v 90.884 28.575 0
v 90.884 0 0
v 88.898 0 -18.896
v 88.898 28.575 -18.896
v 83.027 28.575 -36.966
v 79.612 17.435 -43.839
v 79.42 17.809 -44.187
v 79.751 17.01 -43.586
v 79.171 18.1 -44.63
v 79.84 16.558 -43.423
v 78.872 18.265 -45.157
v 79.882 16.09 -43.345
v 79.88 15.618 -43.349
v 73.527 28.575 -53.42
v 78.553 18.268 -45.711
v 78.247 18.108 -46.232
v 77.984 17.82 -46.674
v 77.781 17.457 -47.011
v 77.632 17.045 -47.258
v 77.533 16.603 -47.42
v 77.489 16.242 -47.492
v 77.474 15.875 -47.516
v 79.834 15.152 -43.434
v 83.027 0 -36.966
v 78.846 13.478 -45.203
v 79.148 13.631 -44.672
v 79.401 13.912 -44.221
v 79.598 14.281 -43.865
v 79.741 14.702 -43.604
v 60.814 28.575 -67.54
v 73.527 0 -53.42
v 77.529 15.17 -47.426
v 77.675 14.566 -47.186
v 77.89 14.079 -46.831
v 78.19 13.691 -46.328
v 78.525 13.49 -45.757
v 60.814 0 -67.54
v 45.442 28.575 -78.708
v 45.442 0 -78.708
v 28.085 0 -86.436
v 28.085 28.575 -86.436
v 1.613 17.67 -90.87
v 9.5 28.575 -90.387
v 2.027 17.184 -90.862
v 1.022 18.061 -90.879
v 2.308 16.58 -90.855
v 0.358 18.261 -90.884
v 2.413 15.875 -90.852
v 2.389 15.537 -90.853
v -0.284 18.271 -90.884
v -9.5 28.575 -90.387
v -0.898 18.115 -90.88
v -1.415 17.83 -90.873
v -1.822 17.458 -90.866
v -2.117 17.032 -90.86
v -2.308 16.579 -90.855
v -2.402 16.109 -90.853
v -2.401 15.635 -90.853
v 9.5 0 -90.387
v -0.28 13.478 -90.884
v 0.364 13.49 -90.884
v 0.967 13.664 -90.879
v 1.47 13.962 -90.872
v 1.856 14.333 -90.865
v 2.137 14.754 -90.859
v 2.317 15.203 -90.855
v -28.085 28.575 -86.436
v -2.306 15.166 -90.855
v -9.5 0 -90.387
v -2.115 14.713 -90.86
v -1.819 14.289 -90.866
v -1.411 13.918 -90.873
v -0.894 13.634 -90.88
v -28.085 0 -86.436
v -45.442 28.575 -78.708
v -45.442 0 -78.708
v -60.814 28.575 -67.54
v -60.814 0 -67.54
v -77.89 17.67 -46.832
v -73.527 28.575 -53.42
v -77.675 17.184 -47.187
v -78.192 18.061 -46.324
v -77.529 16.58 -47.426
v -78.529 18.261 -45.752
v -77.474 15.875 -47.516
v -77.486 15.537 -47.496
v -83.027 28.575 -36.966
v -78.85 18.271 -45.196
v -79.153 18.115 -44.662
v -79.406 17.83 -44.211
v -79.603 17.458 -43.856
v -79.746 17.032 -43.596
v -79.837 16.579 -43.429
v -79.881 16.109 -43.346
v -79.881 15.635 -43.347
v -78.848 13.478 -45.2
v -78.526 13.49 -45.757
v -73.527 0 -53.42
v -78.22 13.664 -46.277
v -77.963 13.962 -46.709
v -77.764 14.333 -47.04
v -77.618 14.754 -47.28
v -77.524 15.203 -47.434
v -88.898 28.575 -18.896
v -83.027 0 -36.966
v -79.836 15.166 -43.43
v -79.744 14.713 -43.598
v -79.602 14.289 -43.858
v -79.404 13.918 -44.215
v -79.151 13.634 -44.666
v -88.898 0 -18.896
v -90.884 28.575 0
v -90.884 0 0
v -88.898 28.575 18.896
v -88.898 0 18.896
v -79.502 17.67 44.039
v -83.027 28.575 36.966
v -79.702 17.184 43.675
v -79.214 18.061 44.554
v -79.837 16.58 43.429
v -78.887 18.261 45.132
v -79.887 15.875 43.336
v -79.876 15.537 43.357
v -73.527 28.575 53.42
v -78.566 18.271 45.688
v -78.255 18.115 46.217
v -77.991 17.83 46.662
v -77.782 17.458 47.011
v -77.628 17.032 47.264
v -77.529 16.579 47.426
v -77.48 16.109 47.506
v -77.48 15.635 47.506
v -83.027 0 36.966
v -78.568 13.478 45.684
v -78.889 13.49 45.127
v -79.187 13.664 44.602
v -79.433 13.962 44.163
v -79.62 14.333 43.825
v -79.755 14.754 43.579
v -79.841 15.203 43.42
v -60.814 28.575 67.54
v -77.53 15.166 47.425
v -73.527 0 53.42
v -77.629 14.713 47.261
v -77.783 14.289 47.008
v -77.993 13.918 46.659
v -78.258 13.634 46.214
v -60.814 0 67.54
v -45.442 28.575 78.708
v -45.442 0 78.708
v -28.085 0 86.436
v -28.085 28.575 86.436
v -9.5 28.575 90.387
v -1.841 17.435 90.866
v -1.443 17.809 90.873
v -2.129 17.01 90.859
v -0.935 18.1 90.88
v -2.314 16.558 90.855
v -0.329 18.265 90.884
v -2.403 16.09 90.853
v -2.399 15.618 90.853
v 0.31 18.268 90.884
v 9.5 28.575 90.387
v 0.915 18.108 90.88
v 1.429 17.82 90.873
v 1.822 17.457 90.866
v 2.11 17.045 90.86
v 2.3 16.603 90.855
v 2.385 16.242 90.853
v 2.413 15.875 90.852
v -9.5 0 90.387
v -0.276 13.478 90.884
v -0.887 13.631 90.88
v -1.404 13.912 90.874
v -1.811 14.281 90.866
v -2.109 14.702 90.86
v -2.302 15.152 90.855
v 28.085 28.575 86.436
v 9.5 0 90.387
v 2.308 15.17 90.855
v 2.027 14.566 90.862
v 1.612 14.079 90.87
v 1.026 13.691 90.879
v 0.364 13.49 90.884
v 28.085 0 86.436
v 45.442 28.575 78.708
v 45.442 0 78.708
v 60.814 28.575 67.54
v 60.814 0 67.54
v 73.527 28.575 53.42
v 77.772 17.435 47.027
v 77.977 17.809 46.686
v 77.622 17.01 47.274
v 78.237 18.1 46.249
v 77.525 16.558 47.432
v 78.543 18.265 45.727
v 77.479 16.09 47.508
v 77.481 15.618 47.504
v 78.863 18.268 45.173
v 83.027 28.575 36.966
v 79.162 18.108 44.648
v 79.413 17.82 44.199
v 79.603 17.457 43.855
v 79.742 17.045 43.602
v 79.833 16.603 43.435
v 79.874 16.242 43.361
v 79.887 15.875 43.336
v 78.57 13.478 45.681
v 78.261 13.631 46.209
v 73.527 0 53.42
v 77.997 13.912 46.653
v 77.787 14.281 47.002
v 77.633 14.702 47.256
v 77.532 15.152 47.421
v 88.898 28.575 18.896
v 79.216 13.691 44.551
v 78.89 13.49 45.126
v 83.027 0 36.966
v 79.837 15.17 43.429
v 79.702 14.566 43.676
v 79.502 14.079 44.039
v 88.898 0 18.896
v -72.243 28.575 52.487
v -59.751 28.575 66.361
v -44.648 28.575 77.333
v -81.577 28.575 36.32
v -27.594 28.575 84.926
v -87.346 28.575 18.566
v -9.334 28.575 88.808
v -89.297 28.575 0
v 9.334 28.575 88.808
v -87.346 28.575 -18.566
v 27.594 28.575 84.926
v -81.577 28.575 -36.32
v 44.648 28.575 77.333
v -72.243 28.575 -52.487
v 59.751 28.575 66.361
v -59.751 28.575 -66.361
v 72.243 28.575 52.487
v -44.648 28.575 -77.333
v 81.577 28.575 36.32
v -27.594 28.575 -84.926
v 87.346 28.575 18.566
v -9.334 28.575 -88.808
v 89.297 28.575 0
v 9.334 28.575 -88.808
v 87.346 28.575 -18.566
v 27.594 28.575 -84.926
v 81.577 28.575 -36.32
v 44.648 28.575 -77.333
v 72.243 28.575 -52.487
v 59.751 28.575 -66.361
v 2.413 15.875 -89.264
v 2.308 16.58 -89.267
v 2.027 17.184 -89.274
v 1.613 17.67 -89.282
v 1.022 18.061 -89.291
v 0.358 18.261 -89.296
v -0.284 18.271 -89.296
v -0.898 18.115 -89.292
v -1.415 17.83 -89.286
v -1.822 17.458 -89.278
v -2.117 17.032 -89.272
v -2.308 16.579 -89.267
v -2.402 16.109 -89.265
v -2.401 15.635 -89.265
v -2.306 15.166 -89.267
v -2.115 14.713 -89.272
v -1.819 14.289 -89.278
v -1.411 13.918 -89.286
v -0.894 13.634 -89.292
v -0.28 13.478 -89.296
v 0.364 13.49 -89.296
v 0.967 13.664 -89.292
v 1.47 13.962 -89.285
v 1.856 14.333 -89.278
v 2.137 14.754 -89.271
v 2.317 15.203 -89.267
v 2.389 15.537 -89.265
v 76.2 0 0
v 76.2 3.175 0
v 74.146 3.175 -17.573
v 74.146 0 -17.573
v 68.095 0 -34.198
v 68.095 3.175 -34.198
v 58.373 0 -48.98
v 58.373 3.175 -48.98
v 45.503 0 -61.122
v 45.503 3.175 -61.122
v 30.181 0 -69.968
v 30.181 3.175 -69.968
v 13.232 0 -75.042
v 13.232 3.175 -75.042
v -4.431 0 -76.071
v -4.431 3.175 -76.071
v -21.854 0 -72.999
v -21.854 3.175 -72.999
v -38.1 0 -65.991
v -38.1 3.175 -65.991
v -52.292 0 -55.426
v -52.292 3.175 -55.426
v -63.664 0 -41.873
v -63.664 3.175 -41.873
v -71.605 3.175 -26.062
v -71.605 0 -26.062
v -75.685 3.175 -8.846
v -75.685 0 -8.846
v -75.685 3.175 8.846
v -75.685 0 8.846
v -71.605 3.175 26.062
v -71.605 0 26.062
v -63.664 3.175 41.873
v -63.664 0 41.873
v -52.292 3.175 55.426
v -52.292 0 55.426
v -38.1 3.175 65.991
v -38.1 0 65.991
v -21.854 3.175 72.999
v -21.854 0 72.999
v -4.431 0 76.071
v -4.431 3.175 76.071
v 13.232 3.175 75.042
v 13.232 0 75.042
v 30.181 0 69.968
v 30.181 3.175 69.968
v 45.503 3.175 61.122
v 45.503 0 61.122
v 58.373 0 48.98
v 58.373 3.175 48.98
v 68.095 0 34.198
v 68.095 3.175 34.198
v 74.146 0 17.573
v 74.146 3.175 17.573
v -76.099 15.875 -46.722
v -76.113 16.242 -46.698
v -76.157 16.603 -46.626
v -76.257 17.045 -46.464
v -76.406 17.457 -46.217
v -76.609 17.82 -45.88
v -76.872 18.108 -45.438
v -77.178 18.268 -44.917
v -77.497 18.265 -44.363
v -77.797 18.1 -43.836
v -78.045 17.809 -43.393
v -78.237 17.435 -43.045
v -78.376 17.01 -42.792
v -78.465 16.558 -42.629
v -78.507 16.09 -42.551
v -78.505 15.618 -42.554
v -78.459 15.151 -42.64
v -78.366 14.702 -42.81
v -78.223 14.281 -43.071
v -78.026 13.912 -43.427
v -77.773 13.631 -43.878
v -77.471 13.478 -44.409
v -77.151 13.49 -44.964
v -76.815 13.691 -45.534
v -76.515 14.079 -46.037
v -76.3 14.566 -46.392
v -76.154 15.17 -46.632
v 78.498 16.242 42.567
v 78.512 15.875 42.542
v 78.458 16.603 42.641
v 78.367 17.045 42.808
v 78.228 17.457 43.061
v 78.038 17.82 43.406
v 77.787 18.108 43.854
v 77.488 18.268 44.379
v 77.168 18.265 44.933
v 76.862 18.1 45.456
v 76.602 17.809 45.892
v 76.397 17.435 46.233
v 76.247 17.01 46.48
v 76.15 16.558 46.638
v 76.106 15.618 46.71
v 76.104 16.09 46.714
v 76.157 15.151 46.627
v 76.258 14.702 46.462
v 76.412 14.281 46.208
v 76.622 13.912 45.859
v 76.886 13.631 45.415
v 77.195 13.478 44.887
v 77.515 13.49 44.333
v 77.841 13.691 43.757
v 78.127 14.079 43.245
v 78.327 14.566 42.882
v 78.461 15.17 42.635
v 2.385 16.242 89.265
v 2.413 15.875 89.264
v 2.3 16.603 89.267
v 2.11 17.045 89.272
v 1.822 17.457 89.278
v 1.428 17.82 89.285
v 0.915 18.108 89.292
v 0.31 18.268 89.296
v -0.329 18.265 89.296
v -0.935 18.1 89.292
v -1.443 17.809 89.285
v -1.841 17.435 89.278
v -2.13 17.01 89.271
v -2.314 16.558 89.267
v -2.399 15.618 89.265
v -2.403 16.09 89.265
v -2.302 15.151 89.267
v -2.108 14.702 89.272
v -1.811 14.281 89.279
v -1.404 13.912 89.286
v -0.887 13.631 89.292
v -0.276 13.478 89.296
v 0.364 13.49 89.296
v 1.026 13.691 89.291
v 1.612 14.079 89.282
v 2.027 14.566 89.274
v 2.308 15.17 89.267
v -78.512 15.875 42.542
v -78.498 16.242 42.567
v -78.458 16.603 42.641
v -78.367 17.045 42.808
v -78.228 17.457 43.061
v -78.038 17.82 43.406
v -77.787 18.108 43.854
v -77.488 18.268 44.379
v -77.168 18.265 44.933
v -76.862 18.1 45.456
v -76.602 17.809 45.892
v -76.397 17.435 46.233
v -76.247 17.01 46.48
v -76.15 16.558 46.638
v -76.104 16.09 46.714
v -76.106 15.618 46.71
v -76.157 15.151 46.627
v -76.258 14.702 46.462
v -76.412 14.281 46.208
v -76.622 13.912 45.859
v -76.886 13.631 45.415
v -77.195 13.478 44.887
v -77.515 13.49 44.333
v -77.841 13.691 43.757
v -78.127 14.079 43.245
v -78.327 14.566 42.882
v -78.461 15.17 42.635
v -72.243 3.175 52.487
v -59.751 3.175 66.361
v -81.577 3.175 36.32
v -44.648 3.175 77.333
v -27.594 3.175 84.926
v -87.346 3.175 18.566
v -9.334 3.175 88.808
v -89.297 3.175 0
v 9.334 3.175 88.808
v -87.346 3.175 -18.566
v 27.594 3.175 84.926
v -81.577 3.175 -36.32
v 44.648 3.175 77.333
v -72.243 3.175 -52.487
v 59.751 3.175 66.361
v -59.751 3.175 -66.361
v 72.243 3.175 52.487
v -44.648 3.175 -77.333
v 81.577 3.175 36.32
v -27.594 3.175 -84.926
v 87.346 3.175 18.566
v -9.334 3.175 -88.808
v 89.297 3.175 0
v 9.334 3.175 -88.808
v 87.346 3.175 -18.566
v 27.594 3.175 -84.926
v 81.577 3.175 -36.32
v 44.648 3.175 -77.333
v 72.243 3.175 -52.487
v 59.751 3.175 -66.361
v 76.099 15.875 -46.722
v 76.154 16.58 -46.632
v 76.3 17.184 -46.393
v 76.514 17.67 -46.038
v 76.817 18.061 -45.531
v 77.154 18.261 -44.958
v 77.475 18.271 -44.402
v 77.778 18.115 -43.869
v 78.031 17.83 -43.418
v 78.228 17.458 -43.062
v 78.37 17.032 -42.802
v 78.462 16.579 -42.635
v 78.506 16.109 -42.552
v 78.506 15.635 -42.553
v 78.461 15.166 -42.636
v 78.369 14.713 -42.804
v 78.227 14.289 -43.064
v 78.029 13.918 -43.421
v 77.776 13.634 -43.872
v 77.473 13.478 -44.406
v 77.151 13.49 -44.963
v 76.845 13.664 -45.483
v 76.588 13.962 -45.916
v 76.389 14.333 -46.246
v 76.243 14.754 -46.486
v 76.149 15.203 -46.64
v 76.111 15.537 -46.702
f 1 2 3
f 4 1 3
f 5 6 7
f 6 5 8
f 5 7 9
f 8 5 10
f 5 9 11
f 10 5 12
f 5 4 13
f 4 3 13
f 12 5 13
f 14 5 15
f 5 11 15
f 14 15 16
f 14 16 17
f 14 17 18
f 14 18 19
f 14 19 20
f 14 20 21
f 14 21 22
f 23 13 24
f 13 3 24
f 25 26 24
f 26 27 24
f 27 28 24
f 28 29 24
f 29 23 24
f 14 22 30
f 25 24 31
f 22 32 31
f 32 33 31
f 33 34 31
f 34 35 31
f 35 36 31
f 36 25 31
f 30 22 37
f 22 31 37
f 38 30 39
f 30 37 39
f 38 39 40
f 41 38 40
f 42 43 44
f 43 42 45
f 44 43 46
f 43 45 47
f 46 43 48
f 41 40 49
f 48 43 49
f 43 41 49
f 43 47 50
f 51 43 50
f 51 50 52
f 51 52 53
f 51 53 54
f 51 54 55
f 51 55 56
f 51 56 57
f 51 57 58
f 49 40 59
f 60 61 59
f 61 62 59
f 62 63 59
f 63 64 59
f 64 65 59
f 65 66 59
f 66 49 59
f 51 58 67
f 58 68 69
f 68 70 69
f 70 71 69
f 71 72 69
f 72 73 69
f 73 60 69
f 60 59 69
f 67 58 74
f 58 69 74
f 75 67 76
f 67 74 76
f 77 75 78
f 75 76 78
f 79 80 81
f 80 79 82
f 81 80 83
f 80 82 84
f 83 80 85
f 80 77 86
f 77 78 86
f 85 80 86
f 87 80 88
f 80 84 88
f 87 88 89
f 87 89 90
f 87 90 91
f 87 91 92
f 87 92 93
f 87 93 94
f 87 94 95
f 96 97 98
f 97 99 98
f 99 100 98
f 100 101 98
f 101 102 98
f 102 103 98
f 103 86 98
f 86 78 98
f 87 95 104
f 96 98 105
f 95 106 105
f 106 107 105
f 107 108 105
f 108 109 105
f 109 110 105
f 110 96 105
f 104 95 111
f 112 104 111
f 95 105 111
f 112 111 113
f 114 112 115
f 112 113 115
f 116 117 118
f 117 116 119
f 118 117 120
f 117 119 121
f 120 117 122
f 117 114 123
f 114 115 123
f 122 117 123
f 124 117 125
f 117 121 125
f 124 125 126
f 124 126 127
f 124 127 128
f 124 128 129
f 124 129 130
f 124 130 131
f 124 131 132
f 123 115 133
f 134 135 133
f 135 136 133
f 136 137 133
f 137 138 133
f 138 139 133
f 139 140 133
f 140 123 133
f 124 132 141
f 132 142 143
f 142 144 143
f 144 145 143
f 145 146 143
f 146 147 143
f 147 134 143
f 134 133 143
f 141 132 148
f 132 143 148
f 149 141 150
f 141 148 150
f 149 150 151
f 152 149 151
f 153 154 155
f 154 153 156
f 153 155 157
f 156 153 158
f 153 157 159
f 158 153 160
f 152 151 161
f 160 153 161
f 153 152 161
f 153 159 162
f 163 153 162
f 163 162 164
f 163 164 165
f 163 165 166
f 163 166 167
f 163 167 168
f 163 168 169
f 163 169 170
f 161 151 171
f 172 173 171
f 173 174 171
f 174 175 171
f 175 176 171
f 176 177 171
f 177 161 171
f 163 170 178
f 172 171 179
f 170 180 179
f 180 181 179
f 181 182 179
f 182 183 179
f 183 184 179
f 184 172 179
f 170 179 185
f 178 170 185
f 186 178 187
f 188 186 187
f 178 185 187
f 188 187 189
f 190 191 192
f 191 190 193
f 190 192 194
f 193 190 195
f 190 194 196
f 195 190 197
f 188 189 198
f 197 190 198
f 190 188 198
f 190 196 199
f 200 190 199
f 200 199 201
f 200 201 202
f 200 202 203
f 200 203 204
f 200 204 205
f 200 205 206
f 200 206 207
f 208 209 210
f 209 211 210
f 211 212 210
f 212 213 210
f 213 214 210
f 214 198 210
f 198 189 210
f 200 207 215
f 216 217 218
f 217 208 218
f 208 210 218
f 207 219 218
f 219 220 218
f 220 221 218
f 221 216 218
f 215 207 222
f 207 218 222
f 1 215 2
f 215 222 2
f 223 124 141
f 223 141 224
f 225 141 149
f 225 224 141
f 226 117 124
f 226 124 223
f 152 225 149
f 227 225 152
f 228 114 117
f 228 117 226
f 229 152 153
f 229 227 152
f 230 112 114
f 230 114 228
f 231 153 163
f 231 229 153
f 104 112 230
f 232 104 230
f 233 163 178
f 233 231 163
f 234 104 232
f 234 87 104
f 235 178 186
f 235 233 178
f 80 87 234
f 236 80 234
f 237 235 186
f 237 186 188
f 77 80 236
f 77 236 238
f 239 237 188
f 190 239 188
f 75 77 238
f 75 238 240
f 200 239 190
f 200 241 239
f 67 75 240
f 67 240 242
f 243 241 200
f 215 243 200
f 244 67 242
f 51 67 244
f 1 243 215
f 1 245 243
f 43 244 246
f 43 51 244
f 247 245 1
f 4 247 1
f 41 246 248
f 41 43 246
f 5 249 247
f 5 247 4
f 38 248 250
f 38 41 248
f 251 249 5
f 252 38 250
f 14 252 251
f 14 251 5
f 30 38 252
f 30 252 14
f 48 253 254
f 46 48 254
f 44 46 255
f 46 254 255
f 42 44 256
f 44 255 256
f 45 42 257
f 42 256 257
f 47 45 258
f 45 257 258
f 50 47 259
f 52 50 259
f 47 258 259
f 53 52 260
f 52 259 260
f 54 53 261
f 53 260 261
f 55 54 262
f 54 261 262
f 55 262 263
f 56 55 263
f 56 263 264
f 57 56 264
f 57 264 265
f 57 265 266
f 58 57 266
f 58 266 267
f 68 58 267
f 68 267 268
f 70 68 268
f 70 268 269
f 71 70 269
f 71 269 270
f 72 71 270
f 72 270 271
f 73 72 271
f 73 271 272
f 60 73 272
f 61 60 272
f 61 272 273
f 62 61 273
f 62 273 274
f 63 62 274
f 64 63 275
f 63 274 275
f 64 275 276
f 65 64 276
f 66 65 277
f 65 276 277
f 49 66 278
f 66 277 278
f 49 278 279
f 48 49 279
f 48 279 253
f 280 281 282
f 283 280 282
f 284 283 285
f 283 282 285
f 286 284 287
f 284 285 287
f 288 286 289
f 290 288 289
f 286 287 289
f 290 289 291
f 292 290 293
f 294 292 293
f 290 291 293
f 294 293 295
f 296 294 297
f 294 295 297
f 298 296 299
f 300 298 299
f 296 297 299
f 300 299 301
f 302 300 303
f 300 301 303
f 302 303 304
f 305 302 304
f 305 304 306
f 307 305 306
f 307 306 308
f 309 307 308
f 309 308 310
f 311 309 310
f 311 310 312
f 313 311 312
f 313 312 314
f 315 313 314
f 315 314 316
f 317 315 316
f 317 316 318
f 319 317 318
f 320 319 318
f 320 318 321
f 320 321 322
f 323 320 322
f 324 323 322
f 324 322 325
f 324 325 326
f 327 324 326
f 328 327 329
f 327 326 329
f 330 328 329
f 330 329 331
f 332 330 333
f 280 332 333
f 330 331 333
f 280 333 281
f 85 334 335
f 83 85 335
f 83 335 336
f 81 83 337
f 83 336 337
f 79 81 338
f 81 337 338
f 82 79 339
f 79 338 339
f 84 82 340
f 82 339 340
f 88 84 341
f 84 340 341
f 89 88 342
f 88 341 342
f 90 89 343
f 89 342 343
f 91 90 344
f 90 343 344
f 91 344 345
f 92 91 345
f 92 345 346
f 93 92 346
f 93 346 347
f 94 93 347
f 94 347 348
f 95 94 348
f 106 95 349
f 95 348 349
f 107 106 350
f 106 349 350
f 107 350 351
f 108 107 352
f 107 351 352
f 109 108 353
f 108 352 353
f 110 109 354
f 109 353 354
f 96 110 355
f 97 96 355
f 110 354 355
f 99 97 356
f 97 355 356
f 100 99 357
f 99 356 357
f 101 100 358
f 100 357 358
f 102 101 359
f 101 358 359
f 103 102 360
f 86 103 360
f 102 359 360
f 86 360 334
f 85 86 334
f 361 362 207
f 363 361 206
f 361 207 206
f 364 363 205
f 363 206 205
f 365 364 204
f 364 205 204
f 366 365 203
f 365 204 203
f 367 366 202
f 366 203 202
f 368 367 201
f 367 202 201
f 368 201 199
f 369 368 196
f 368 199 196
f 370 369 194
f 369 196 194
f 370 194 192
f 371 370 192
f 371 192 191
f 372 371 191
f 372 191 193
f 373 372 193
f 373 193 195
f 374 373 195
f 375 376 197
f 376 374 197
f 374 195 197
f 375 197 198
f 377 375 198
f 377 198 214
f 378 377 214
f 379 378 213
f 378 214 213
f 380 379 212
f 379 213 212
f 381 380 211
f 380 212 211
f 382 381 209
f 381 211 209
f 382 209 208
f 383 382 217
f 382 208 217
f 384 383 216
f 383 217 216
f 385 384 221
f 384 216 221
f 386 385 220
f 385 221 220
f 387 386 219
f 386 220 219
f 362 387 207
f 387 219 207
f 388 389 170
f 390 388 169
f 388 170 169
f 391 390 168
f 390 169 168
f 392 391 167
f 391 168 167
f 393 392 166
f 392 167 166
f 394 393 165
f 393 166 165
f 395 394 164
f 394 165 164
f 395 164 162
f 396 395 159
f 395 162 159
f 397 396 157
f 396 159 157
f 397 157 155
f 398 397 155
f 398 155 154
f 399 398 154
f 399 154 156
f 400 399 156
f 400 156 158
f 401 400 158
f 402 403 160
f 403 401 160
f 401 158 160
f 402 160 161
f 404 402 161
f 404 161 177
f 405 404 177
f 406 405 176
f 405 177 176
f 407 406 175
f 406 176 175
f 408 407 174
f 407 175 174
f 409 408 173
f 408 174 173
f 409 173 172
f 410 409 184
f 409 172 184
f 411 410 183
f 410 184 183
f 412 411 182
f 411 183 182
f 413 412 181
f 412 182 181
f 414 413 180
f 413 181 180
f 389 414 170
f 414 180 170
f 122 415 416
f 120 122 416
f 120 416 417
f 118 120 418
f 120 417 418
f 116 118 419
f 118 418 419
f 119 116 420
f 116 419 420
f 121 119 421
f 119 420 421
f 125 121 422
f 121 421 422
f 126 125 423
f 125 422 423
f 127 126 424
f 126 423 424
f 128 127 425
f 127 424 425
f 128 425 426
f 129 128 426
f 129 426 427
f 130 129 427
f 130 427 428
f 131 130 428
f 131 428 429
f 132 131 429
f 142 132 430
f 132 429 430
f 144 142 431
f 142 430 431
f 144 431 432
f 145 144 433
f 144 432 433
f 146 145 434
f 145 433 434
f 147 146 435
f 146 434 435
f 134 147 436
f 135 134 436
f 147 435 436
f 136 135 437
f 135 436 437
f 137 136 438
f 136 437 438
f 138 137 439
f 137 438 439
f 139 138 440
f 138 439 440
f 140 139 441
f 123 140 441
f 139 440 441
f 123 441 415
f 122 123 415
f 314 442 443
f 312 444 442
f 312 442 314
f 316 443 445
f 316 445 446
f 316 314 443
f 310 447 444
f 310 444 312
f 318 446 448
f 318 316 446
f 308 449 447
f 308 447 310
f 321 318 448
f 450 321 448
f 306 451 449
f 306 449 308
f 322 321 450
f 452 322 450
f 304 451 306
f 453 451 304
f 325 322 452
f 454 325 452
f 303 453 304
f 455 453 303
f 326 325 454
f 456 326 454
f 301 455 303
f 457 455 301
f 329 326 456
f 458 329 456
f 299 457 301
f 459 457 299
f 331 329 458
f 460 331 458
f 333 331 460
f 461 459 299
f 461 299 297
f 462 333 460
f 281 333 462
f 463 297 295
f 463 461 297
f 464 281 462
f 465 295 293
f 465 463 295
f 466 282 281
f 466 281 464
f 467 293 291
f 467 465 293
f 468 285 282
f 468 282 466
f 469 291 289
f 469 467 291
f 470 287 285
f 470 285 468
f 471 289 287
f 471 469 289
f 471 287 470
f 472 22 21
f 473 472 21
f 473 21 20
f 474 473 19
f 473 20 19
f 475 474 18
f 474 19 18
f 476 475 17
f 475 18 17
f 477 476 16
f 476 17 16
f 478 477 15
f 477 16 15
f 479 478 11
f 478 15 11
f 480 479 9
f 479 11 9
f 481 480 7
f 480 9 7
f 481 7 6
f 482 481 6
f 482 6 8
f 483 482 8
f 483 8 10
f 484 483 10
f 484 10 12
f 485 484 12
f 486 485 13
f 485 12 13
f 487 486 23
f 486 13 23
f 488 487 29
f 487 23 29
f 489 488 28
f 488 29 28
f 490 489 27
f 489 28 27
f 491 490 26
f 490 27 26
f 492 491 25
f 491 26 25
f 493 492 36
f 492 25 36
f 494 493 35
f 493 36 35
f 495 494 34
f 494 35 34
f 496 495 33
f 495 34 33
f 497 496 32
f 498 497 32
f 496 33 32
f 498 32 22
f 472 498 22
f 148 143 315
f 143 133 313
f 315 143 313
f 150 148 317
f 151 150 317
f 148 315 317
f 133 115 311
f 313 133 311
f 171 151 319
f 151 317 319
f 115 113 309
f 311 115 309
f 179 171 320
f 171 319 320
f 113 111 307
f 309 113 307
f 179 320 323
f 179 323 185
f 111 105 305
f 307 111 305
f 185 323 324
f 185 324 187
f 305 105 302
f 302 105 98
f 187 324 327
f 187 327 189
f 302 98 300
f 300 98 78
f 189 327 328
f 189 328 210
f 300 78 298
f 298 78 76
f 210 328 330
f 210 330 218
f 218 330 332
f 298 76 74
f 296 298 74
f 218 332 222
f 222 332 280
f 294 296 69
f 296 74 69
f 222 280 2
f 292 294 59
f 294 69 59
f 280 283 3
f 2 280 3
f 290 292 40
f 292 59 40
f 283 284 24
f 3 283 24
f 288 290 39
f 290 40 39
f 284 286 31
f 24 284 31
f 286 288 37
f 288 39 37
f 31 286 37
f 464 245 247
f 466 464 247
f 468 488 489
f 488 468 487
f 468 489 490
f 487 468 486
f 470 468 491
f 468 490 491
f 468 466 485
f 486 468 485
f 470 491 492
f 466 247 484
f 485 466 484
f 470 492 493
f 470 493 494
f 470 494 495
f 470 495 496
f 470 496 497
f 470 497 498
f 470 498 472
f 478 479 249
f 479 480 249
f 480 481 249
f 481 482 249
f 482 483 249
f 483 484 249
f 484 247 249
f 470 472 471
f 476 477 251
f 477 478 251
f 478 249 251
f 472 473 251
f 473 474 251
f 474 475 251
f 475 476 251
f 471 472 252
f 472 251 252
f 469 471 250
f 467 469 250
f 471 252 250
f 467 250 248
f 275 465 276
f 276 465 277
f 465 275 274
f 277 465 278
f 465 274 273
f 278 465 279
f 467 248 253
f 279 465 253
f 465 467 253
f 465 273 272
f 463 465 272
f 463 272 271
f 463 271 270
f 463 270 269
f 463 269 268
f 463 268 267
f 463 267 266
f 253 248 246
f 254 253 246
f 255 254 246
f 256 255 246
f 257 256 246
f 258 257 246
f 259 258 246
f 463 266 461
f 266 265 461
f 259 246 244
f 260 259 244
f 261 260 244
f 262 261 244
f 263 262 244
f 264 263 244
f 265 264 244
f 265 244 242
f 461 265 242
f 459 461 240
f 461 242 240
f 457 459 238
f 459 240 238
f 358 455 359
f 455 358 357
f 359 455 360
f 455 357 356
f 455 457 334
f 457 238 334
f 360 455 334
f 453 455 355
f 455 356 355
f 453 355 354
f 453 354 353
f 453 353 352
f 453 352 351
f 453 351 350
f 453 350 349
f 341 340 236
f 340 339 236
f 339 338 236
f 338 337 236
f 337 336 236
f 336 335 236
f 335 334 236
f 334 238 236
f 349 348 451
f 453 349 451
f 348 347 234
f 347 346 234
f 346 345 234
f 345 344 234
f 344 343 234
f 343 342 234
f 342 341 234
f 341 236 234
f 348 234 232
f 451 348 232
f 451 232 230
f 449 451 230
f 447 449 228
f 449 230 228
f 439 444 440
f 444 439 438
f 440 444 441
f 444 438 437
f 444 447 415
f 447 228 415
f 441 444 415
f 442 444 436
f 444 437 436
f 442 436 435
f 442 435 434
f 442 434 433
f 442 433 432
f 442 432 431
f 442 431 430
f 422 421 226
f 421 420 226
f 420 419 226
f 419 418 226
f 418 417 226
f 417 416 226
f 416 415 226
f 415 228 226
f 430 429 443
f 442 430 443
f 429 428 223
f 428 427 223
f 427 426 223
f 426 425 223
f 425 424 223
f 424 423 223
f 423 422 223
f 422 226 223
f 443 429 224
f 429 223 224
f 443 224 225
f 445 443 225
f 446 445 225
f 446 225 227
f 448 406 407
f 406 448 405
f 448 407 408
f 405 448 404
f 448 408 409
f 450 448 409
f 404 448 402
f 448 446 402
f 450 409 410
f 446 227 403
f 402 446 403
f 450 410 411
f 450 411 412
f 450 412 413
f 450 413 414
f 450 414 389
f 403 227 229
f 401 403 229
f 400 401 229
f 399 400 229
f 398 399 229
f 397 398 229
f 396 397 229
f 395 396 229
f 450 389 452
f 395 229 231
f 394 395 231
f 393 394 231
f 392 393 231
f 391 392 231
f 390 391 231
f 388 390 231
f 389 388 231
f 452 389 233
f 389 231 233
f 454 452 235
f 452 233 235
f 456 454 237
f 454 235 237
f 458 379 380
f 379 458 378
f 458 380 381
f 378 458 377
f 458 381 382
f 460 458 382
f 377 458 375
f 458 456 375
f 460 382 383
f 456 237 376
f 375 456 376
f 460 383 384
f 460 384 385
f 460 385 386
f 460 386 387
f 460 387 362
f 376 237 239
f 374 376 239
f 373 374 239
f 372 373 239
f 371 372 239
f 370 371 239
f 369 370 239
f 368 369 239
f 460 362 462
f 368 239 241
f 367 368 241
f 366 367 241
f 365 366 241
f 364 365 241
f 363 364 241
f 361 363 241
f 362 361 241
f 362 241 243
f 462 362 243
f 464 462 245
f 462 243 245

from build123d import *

# Parameters (mm, degrees)
SKETCH1_R           = 90.884375
BOSS_EXTRUDE1_DEPTH = 28.575
SKETCH2_R           = 89.296875
CUT_EXTRUDE1_DEPTH  = 25.4
SKETCH3_R           = 76.2
CUT_EXTRUDE2_DEPTH  = 4.175
SKETCH4_R           = 2.413
CUT_EXTRUDE3_DEPTH  = 91.884375
CIRPATTERN1_COUNT   = 6


with BuildPart() as part:
    # Sketch1 → Boss-Extrude1 (new body)
    with BuildSketch(Plane(origin=(0, 0, 0), x_dir=(1, 0, 0), z_dir=(0, 1, 0))):
        Circle(SKETCH1_R)
    extrude(amount=BOSS_EXTRUDE1_DEPTH)

    # Sketch2 → Cut-Extrude1 (cut)
    with BuildSketch(Plane(origin=(0, 28.575, 0), x_dir=(1, 0, 0), z_dir=(0, 1, 0))):
        Circle(SKETCH2_R)
    extrude(amount=-CUT_EXTRUDE1_DEPTH, mode=Mode.SUBTRACT)

    # Sketch3 → Cut-Extrude2 (cut, through all)
    with BuildSketch(Plane(origin=(0, 3.175, 0), x_dir=(1, 0, 0), z_dir=(0, 1, 0))):
        Circle(SKETCH3_R)
    extrude(amount=-CUT_EXTRUDE2_DEPTH, mode=Mode.SUBTRACT)

    # Sketch4 → Cut-Extrude3 (cut, symmetric)
    with BuildSketch(Plane.XY):
        with Locations((0, 15.875)):
            Circle(SKETCH4_R)
    cut_extrude3 = extrude(amount=CUT_EXTRUDE3_DEPTH, both=True, mode=Mode.SUBTRACT)

    # CirPattern1: Cut-Extrude3 ×6 about axis
    cirpattern1_axis = Axis((0, 28.575, 0), (0, 1, 0))
    for i in range(1, CIRPATTERN1_COUNT):
        add(cut_extrude3.rotate(cirpattern1_axis, i * 360 / CIRPATTERN1_COUNT), mode=Mode.SUBTRACT)


solid = part.part
